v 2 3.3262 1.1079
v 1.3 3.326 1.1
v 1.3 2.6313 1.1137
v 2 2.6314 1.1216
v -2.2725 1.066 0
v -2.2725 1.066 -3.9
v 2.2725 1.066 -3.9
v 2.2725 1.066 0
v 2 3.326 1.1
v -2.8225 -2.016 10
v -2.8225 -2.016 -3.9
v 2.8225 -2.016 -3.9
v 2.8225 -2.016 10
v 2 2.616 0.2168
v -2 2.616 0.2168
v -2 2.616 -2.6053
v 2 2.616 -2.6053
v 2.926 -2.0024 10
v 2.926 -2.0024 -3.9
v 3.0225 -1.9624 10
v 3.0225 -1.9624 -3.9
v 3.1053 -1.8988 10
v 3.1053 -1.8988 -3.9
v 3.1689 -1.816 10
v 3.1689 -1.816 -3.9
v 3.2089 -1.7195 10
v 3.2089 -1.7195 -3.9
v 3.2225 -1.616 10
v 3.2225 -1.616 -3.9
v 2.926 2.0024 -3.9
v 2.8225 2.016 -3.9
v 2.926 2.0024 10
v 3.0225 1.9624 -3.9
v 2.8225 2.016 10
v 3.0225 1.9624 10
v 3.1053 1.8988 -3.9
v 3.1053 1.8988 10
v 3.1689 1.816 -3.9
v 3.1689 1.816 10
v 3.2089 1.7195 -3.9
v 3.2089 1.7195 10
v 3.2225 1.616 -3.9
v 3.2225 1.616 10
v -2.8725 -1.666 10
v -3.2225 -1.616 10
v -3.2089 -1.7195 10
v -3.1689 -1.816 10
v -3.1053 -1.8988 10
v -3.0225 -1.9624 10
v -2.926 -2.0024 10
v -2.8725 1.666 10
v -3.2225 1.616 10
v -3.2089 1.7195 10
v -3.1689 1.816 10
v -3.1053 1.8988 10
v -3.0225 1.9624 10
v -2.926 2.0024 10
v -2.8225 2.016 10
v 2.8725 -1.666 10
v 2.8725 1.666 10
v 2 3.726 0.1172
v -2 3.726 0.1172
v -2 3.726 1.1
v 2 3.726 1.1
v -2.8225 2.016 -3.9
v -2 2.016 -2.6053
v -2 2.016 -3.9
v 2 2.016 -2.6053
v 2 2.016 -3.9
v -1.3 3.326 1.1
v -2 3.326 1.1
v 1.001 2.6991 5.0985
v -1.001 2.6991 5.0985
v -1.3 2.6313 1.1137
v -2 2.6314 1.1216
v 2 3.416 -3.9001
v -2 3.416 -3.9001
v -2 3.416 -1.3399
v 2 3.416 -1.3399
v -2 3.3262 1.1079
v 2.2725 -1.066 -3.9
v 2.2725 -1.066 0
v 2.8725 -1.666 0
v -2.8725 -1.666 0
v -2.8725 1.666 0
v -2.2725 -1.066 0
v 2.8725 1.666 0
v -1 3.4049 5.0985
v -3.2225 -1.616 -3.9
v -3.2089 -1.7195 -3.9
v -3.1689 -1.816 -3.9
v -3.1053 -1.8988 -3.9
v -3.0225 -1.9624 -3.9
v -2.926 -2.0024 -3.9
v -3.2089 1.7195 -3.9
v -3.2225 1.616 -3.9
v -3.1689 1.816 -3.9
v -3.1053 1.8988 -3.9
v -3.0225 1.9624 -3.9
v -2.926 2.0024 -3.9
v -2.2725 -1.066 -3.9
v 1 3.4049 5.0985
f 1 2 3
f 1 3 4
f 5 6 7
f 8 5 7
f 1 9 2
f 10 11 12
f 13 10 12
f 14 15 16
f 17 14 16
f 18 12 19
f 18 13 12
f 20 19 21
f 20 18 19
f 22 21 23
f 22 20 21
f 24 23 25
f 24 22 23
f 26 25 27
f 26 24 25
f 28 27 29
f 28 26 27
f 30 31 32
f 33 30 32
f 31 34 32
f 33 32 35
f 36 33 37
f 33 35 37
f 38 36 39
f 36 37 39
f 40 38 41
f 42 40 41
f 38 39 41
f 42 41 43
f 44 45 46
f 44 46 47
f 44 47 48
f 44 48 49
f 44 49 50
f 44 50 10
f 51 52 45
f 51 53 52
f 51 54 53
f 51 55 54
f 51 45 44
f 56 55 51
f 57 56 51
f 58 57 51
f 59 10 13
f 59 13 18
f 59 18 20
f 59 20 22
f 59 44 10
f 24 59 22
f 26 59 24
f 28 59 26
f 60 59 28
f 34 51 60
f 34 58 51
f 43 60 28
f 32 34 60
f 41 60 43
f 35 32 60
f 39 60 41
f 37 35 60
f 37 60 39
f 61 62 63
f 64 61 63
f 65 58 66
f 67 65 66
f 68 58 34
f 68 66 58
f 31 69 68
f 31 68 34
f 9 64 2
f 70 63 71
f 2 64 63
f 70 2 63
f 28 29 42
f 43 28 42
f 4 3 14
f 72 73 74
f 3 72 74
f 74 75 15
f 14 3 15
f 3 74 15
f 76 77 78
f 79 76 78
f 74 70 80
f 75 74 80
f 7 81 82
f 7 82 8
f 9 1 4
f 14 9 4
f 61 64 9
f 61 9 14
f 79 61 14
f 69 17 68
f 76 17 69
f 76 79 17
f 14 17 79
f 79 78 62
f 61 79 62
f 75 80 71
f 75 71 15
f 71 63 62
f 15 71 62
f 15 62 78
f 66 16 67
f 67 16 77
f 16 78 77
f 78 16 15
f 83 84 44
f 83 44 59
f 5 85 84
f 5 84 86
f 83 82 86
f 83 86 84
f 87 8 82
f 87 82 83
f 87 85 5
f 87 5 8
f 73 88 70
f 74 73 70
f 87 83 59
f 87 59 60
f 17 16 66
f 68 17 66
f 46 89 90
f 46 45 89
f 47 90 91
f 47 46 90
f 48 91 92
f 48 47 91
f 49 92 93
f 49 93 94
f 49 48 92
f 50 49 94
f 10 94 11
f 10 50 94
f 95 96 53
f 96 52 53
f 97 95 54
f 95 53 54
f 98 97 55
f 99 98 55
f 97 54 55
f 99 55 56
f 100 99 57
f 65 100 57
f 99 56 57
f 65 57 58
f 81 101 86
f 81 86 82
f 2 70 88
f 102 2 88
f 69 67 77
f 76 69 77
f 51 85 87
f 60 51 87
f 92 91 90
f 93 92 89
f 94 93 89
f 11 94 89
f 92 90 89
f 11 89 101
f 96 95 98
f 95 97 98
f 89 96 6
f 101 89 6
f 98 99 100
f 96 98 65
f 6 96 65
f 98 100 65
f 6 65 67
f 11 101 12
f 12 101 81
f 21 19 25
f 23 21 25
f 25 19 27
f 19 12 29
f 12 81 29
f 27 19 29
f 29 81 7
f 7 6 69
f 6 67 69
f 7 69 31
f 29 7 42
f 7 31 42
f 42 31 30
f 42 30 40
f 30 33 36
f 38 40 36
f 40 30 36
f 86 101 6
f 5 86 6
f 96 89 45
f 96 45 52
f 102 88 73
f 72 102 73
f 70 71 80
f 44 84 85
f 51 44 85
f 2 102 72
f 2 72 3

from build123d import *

# Parameters (mm, degrees)
BOSS_EXTRUDE1_DEPTH      = 10
BOSS_EXTRUDE1_DEPTH_BACK = 3.9
SKETCH2_W                = 6.445
SKETCH2_H                = 4.032
SKETCH2_W_2              = 4.545
SKETCH2_H_2              = 2.132
SKETCH3_W                = 5.745
SKETCH3_H                = 3.332
CUT_EXTRUDE1_DEPTH       = 10
FILLET1_R                = 0.4
BOSS_EXTRUDE2_DEPTH      = 2
BOSS_EXTRUDE2_DEPTH_BACK = 2
CUT_EXTRUDE2_REACH       = 13.831


with BuildPart() as part:
    # Sketch2 → Boss-Extrude1 (new, two sides: drawn at the far end of the back side and taken through both)
    with BuildSketch(Plane.XY.offset(-BOSS_EXTRUDE1_DEPTH_BACK)):
        Rectangle(SKETCH2_W, SKETCH2_H)
        Rectangle(SKETCH2_W_2, SKETCH2_H_2, mode=Mode.SUBTRACT)
    extrude(amount=BOSS_EXTRUDE1_DEPTH + BOSS_EXTRUDE1_DEPTH_BACK)

    # Sketch3 → Cut-Extrude1 (cut)
    with BuildSketch(Plane.XY):
        Rectangle(SKETCH3_W, SKETCH3_H)
    extrude(amount=CUT_EXTRUDE1_DEPTH, mode=Mode.SUBTRACT)

    # Fillet1
    fillet1_edges = [part.edges().sort_by_distance(p)[0] for p in [
        (-3.2225, 2.016, 3.05),
        (3.2225, 2.016, 3.05),
        (3.2225, -2.016, 3.05),
        (-3.2225, -2.016, 3.05),
    ]]
    fillet(fillet1_edges, radius=FILLET1_R)

    # Sketch6 → Boss-Extrude2 (add, two sides: drawn at the far end of the back side and taken through both)
    with BuildSketch(Plane(origin=(0, 0, 0), x_dir=(0, 0, -1), z_dir=(1, 0, 0)).offset(-BOSS_EXTRUDE2_DEPTH_BACK)):
        Polygon((3.9, 2.016), (3.9001, 3.416), (1.339853874, 3.416), (-0.11724349, 3.726), (-1.1, 3.726), (-1.1, 3.326), (-5.098455185, 3.40488658), (-5.098455185, 2.699069635), (-0.216775103, 2.616), (2.605304601, 2.616), (2.605304601, 2.016), align=None)
    extrude(amount=BOSS_EXTRUDE2_DEPTH + BOSS_EXTRUDE2_DEPTH_BACK)

    # Cut-Extrude2: up to this plane
    cut_extrude2_end = Plane(origin=(-2, 2.699069635, 5.098455185), z_dir=(0, -0.9998552489648911, 0.017014144626037273))
    # Sketch7 → Cut-Extrude2 (cut, up to the surface)
    with BuildSketch(Plane(origin=(0, 3.303012132, -0.065166), x_dir=(1, 0, 0), z_dir=(0, 0.9998054348584555, -0.019725425914151256)), mode=Mode.PRIVATE) as cut_extrude2_sk1:
        Polygon((-1, -5.164626041), (-1.3, -1.165392745), (-2, -1.173282915), (-2, -5.164626041), align=None)
    cut_extrude2_tool1 = split(extrude(cut_extrude2_sk1.sketch, amount=-CUT_EXTRUDE2_REACH, mode=Mode.PRIVATE), bisect_by=cut_extrude2_end, keep=Keep.BOTH, mode=Mode.PRIVATE)
    add(cut_extrude2_tool1.solids().sort_by_distance((-1.570429, 3.367797, 3.218548))[0], mode=Mode.SUBTRACT)
    # Sketch7 → Cut-Extrude2 (cut, up to the surface)
    with BuildSketch(Plane(origin=(0, 3.303012132, -0.065166), x_dir=(1, 0, 0), z_dir=(0, 0.9998054348584555, -0.019725425914151256)), mode=Mode.PRIVATE) as cut_extrude2_sk2:
        Polygon((1, -5.164626041), (1.3, -1.165392745), (2, -1.173282915), (2, -5.164626041), align=None)
    cut_extrude2_tool2 = split(extrude(cut_extrude2_sk2.sketch, amount=-CUT_EXTRUDE2_REACH, mode=Mode.PRIVATE), bisect_by=cut_extrude2_end, keep=Keep.BOTH, mode=Mode.PRIVATE)
    add(cut_extrude2_tool2.solids().sort_by_distance((1.570429, 3.367797, 3.218548))[0], mode=Mode.SUBTRACT)


solid = part.part
